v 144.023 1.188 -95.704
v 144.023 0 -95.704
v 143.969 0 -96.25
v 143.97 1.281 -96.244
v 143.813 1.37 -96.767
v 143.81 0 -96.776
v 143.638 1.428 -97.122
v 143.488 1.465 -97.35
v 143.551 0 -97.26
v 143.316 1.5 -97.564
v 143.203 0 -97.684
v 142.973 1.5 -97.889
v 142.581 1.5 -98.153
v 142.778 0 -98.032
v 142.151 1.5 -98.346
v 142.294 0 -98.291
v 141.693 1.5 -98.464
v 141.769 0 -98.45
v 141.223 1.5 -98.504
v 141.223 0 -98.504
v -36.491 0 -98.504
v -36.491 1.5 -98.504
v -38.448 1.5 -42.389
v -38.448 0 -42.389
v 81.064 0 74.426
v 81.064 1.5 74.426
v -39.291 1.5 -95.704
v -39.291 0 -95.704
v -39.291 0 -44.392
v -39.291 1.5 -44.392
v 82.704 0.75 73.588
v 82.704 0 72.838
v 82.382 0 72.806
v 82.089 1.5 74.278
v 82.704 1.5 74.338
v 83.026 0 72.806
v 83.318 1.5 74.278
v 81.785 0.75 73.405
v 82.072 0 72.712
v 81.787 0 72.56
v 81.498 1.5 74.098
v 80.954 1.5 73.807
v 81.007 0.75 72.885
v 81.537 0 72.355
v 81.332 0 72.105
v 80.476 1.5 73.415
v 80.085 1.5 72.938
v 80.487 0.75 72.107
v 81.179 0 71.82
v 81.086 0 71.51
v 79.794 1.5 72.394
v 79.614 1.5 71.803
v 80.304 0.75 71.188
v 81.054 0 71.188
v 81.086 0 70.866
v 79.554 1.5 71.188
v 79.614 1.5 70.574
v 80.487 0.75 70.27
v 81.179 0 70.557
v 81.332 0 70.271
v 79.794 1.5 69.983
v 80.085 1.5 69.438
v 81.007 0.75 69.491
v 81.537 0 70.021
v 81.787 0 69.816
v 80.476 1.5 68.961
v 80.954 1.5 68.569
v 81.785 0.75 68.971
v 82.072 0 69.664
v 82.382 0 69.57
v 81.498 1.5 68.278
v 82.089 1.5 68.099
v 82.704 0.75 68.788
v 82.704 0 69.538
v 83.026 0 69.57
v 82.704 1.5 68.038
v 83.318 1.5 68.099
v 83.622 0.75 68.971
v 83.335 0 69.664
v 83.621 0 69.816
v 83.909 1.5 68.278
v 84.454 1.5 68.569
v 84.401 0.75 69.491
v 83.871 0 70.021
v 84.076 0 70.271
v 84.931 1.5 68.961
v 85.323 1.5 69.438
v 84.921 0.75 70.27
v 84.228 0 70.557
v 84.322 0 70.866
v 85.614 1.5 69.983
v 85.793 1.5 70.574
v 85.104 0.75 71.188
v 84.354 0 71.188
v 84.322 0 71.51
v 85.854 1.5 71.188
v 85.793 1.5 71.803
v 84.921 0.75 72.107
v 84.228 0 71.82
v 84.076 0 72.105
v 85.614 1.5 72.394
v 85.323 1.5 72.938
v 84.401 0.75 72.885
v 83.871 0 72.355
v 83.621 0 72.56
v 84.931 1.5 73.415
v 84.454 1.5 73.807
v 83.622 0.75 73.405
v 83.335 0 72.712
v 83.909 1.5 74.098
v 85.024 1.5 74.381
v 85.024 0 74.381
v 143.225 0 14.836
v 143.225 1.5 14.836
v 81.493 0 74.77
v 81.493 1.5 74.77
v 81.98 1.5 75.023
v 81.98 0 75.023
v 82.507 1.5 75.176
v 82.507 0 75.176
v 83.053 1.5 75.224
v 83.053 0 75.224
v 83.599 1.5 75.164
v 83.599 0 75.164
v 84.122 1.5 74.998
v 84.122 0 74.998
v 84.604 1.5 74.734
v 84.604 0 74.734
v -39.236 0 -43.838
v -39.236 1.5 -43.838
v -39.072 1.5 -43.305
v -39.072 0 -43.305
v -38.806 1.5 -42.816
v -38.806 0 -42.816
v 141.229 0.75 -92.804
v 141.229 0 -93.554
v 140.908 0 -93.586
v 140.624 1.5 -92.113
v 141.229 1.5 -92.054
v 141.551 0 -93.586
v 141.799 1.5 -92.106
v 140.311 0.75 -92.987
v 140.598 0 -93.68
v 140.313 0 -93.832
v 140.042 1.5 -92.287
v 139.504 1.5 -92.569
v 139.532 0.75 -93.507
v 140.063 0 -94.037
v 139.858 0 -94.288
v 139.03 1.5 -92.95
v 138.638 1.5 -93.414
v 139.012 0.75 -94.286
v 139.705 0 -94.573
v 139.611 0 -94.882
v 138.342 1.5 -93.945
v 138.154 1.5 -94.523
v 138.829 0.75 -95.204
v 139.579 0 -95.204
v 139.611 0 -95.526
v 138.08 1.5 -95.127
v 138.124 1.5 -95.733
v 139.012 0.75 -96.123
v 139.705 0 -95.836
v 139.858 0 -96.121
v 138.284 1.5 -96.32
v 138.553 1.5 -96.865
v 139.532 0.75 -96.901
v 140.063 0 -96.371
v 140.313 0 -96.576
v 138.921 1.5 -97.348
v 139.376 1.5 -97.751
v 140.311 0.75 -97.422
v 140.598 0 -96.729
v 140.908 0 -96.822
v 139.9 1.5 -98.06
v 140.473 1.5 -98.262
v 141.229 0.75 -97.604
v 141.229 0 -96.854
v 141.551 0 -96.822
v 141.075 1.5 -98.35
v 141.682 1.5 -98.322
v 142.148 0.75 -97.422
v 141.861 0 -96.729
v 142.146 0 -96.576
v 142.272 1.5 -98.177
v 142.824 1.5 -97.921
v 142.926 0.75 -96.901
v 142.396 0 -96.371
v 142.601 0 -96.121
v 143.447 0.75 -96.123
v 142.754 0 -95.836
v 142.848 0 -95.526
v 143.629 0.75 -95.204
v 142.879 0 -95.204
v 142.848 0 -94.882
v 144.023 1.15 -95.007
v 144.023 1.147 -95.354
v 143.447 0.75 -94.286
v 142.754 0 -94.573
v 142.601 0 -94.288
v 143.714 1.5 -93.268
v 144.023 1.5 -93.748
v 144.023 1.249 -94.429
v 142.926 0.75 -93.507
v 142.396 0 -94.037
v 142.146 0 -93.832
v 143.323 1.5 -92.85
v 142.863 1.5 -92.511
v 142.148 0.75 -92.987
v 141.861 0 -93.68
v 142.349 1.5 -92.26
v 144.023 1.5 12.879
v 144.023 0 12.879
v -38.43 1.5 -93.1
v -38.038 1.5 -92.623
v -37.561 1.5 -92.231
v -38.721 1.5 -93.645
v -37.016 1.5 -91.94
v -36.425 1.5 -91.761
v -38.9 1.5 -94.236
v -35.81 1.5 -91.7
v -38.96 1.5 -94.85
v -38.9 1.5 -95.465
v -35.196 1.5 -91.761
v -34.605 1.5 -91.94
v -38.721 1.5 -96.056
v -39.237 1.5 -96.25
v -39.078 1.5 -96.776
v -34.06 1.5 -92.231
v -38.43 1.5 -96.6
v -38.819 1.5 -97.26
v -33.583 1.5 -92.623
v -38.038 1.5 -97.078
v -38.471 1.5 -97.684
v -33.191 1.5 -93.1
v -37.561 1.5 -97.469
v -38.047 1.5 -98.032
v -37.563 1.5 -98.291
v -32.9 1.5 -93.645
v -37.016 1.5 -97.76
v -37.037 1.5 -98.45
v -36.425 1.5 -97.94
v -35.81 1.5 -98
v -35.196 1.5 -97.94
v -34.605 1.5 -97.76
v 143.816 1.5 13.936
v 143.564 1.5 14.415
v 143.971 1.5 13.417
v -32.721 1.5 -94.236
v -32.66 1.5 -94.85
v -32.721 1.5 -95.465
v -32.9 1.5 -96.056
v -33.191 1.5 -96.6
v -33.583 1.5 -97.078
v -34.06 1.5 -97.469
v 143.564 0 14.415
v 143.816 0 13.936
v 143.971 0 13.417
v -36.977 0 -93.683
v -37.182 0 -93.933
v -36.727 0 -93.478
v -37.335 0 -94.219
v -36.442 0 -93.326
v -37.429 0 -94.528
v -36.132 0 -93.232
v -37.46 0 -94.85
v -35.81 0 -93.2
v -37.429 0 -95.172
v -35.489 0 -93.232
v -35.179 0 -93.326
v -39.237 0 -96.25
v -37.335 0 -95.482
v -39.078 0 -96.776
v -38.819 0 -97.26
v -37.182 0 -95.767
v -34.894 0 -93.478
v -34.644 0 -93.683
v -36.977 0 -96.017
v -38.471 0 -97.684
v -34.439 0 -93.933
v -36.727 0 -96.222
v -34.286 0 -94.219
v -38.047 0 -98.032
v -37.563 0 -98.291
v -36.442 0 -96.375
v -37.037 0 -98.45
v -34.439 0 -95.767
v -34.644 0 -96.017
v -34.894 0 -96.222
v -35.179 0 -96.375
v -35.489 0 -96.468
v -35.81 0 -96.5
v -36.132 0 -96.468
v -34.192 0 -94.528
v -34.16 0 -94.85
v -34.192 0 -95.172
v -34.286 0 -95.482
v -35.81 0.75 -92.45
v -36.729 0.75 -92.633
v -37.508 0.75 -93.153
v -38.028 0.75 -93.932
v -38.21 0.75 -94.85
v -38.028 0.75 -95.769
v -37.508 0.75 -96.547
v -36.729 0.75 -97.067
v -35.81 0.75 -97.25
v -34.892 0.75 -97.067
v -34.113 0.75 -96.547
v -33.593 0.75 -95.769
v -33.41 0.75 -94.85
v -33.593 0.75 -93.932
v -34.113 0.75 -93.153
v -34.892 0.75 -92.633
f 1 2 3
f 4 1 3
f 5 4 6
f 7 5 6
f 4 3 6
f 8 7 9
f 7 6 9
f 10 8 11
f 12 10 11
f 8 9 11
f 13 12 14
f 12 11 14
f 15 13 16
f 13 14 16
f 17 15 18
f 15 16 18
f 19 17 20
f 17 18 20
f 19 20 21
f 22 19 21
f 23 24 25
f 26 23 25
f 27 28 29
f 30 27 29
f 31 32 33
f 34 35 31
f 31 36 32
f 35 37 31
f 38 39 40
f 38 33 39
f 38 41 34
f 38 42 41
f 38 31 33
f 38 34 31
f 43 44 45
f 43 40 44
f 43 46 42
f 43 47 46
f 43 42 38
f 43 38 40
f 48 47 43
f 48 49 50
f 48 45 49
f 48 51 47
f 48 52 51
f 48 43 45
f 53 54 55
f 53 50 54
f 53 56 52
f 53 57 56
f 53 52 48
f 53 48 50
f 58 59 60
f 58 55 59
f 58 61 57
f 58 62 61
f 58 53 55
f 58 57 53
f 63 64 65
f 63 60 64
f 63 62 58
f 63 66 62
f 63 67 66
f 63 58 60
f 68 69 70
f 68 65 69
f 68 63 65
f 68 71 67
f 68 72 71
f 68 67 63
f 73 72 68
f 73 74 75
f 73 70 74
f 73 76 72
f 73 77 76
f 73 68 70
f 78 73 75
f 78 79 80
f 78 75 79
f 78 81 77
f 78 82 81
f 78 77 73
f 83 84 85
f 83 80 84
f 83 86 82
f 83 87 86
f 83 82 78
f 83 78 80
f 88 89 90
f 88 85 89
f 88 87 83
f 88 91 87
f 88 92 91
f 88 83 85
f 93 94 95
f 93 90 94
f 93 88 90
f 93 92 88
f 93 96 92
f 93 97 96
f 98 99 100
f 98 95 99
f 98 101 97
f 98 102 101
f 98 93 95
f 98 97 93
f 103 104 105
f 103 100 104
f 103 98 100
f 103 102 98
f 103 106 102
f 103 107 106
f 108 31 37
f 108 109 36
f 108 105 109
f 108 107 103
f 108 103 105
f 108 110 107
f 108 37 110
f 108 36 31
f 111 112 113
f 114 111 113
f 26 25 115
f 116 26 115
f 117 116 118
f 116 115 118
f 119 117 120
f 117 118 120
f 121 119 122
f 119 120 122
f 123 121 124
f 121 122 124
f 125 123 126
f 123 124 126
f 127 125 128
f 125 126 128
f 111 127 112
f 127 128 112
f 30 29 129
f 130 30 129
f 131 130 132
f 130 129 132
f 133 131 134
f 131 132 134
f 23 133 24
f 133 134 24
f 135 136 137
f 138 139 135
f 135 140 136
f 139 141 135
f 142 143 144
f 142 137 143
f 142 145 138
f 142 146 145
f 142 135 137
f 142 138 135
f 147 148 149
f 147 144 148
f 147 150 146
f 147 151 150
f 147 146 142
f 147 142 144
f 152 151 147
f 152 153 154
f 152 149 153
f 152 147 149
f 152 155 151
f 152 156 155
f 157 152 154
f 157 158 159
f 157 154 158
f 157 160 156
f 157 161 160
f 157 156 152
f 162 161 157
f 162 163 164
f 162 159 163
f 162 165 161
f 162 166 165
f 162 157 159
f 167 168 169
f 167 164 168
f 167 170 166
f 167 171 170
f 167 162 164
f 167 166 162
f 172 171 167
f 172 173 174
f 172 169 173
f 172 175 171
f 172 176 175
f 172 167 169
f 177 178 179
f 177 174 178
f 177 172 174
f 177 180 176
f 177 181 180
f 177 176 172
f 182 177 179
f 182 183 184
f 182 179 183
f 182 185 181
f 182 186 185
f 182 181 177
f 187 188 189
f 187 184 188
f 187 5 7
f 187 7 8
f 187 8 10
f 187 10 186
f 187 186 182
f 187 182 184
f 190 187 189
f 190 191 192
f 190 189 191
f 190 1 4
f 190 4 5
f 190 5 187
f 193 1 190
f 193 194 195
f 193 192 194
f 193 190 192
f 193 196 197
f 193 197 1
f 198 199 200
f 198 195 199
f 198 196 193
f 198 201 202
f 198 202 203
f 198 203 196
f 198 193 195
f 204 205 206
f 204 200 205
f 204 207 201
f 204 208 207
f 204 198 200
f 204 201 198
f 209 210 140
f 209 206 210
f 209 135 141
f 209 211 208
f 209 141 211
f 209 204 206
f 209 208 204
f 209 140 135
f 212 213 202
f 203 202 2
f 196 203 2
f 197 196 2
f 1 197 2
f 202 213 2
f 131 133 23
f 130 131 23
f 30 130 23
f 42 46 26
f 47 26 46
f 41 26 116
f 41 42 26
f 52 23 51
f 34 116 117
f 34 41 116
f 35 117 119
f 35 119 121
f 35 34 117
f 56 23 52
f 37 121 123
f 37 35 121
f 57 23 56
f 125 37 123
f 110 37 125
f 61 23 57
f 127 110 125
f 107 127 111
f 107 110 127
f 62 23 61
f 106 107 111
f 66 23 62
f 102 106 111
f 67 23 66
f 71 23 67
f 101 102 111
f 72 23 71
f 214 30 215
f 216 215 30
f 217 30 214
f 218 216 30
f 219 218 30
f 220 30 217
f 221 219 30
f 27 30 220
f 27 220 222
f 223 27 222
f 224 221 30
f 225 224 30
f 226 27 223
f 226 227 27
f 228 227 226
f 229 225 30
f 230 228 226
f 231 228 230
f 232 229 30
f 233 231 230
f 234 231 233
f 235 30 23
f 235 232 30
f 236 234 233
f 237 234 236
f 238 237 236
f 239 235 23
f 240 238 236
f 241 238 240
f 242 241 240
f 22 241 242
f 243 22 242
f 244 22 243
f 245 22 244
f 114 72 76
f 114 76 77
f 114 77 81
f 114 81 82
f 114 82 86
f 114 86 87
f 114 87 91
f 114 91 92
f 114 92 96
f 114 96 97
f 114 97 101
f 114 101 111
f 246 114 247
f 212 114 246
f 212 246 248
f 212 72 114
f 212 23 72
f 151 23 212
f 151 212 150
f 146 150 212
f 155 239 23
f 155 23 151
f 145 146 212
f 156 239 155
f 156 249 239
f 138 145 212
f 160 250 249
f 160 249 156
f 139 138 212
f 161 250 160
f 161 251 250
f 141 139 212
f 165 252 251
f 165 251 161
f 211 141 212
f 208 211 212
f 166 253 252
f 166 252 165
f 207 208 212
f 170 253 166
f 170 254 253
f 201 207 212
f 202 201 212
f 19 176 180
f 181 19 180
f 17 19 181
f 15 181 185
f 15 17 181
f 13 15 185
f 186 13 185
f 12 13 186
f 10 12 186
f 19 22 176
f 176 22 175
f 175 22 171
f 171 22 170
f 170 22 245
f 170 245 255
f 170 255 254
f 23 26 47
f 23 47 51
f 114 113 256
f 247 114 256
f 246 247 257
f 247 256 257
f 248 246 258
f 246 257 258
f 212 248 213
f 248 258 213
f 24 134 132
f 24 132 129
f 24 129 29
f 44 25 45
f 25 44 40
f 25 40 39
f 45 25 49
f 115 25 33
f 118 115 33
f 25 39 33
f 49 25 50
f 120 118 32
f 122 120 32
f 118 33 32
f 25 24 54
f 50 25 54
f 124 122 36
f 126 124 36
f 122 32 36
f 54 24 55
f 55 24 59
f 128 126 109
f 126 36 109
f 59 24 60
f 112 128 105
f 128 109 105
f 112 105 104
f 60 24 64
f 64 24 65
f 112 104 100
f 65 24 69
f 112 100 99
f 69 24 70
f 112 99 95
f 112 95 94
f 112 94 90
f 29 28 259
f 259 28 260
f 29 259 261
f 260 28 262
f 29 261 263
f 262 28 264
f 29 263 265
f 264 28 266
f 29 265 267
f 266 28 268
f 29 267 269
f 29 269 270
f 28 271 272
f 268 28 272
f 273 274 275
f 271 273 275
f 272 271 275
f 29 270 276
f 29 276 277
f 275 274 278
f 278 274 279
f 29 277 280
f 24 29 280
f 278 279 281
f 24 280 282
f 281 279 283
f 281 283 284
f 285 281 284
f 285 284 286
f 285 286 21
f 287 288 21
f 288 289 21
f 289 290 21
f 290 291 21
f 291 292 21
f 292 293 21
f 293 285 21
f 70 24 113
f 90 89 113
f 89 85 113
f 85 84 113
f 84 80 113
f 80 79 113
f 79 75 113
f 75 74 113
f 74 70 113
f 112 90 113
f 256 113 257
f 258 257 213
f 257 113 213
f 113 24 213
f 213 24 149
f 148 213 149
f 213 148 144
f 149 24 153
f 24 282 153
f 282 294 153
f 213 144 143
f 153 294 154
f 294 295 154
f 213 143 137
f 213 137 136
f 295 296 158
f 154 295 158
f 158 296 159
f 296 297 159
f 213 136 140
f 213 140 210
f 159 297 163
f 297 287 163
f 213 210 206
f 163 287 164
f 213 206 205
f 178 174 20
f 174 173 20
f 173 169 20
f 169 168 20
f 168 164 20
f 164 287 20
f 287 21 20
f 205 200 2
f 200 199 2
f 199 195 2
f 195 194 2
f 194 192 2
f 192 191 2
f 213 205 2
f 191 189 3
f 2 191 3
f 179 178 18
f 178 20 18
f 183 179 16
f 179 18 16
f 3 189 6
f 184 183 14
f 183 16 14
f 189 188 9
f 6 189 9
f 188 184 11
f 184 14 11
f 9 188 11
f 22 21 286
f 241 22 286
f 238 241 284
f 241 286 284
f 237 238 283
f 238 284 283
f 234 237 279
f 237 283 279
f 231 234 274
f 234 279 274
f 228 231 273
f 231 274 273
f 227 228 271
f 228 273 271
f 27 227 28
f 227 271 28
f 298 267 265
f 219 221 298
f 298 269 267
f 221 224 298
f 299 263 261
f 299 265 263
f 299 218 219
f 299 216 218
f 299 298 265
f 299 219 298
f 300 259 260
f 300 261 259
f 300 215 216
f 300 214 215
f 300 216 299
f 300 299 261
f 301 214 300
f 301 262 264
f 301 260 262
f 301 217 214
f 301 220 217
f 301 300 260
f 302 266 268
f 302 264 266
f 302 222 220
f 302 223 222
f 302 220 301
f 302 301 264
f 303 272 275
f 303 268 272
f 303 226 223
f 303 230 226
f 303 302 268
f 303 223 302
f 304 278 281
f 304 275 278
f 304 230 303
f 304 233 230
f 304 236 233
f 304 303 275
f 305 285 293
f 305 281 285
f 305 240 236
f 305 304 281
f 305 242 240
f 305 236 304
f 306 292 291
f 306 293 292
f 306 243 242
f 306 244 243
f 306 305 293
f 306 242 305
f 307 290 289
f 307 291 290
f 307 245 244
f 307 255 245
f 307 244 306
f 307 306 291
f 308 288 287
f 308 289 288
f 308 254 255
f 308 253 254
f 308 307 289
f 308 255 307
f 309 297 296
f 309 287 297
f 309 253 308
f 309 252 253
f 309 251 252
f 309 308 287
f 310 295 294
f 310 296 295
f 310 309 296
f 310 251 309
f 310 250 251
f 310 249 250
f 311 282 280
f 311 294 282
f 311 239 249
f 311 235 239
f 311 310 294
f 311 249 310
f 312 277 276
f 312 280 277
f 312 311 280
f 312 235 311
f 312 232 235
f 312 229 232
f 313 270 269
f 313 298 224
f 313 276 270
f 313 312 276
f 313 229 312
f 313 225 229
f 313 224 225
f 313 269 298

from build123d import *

# Parameters (mm, degrees)
BOSS_EXTRUDE2_DEPTH                            = 1.5
CSK_FOR_M3_FLAT_HEAD_MACHINE_SCREW1_AT_2_COUNT = 2
CSK_FOR_M3_FLAT_HEAD_MACHINE_SCREW1_AT_2_PITCH = 177.040281246
CSK_FOR_M3_FLAT_HEAD_MACHINE_SCREW1_AT_3_COUNT = 2
CSK_FOR_M3_FLAT_HEAD_MACHINE_SCREW1_AT_3_PITCH = 203.995944874


with BuildPart() as part:
    # Sketch1 → Boss-Extrude2 (new body)
    with BuildSketch(Plane(origin=(0, 0, 0), x_dir=(1, 0, 0), z_dir=(0, 1, 0))):
        with BuildLine():
            Line((85.023837811, -74.381167696), (143.225208545, -14.836107228))
            ThreePointArc((143.225208545, -14.836107228), (143.81578007, -13.935666345), (144.022845875, -12.878929736))
            Line((144.022845875, -12.878929736), (144.022845875, 95.704196999))
            ThreePointArc((144.022845875, 95.704196999), (143.202744862, 97.684095986), (141.222845875, 98.504196999))
            Line((141.222845875, 98.504196999), (-36.49118484, 98.504196999))
            ThreePointArc((-36.49118484, 98.504196999), (-38.471083828, 97.684095986), (-39.29118484, 95.704196999))
            Line((-39.29118484, 95.704196999), (-39.29118484, 44.391755323))
            ThreePointArc((-39.29118484, 44.391755323), (-39.071891815, 43.305499593), (-38.448362333, 42.389392653))
            Line((-38.448362333, 42.389392653), (81.064297648, -74.426352874))
            ThreePointArc((81.064297648, -74.426352874), (83.053425886, -75.223807903), (85.023837811, -74.381167696))
        make_face()
    extrude(amount=BOSS_EXTRUDE2_DEPTH)

    # Sketch3 → CSK for M3 Flat Head Machine Screw1 (revolve, cut)
    with BuildSketch(Plane(origin=(-35.810496246, 1.5, -94.85013004), x_dir=(0, 0, 1), z_dir=(1, 0, 0))):
        Polygon((0, 0), (0, 1.5), (1.6, 1.5), (1.6, 1.55), (3.15, 0), align=None)
    csk_for_m3_flat_head_machine_screw1 = revolve(axis=Axis((-35.810496246, 7.85, -94.85013004), (0, -1, 0)), mode=Mode.SUBTRACT)

    # CSK for M3 Flat Head Machine Screw1 at 2: CSK for M3 Flat Head Machine Screw1 ×2
    with Locations(*[Vector(0.999998, 0, -0.001999923) * (i * CSK_FOR_M3_FLAT_HEAD_MACHINE_SCREW1_AT_2_PITCH) for i in range(1, CSK_FOR_M3_FLAT_HEAD_MACHINE_SCREW1_AT_2_COUNT)]):
        add(csk_for_m3_flat_head_machine_screw1, mode=Mode.SUBTRACT)

    # CSK for M3 Flat Head Machine Screw1 at 3: CSK for M3 Flat Head Machine Screw1 ×2
    with Locations(*[Vector(0.580964274, 0, 0.813929058) * (i * CSK_FOR_M3_FLAT_HEAD_MACHINE_SCREW1_AT_3_PITCH) for i in range(1, CSK_FOR_M3_FLAT_HEAD_MACHINE_SCREW1_AT_3_COUNT)]):
        add(csk_for_m3_flat_head_machine_screw1, mode=Mode.SUBTRACT)


solid = part.part
